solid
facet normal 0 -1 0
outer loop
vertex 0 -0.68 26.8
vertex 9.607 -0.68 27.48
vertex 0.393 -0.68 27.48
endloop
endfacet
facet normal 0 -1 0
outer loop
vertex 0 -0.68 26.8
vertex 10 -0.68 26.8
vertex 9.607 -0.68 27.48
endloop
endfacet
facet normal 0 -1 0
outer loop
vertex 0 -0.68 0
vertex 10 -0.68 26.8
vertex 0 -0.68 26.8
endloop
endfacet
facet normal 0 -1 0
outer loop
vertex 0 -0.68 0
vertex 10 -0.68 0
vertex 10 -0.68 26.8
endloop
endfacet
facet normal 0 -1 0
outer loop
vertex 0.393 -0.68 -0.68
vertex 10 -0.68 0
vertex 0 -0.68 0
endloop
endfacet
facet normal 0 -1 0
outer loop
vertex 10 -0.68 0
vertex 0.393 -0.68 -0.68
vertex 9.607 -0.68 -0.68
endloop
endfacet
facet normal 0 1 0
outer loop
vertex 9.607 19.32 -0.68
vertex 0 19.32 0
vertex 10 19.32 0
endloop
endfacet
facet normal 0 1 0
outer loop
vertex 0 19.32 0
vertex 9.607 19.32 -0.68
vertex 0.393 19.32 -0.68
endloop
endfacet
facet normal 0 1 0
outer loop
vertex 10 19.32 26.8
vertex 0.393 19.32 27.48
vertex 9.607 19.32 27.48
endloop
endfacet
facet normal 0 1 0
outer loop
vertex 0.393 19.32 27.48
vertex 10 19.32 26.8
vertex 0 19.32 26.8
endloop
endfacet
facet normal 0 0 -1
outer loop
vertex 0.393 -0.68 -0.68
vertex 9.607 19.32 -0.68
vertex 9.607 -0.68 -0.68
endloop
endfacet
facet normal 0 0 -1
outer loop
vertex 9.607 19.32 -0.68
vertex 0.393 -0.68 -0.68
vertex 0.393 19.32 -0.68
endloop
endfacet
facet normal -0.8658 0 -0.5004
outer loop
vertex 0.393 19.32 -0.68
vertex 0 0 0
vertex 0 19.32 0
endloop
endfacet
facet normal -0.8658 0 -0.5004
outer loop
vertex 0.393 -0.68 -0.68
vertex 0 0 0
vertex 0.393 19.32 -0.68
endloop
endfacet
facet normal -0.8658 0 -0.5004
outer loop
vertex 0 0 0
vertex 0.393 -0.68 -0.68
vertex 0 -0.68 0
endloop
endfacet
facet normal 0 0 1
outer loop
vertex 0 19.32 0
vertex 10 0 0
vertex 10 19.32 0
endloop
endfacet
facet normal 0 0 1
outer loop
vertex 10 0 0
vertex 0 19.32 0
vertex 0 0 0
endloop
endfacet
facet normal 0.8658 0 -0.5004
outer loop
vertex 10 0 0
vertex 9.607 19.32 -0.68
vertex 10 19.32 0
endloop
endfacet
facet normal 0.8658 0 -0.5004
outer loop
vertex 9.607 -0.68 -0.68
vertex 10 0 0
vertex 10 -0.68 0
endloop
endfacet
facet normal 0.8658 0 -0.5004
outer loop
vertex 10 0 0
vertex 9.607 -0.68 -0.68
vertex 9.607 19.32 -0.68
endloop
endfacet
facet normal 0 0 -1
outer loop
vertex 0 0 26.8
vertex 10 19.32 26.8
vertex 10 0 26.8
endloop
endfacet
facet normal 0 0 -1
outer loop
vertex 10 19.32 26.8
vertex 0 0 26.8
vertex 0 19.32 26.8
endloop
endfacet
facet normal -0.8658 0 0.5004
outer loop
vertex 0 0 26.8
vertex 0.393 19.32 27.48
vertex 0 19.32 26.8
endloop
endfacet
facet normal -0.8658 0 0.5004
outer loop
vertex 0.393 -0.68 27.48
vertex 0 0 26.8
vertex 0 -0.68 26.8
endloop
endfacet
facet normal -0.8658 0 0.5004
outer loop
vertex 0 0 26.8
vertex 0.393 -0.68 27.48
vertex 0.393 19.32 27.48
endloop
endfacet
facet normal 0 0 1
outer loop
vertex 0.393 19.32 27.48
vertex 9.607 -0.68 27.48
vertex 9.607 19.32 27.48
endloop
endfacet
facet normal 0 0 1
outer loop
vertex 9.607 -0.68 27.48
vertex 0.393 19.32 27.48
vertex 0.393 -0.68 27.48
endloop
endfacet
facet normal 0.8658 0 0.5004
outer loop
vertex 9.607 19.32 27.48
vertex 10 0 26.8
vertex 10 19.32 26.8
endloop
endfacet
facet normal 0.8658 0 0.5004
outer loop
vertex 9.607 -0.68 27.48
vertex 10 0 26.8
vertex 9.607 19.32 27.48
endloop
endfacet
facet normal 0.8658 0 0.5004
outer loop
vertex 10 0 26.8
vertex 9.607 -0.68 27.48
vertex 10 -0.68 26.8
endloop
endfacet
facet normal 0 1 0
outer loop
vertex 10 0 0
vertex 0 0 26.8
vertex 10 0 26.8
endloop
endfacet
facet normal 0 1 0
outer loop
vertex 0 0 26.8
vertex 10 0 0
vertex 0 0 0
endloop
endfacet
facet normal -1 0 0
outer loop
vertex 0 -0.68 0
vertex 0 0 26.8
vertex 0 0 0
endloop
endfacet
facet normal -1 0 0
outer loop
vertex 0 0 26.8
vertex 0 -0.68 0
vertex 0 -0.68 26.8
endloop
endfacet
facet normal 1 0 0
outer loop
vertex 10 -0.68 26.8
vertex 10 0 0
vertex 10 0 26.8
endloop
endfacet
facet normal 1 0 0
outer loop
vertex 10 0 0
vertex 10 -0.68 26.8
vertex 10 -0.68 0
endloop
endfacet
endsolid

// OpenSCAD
width = 70.0;
depth = 98.6;
height = 26.8;

wall_thicknesses = [0,.68,1.28];
loose=.4;
dovetail_width=10;
dovetail_height = wall_thicknesses[1];
dovetail_angle=30;


module mirror2(xyz){
    mirror(xyz) children();
    children();
}

module base(){
    cube([width, depth, height]);
}

%base();

module encasement(){
    difference(){
        minkowski(){
            cube([width+loose, depth+loose, height+loose]);
            sphere(r=wall_thicknesses[1]);
        }
        base();
    }
}

//encasement();

module dove_flat(){
    mirror2([0,1])
        translate([0,height/2])
        polygon([
            [tan(dovetail_angle)*dovetail_height,dovetail_height],
            [0,0],
            [dovetail_width,0],
            [dovetail_width-tan(dovetail_angle)*dovetail_height,dovetail_height]]);
}

module dove(){
    linear_extrude(height=20){
        dove_flat();
    }
    linear_extrude(height=dovetail_height){
        hull() dove_flat();
    }
}
module assembly(){
    translate([0,-dovetail_height,height/2]) rotate([-90,0,0]) dove();
}
assembly();
